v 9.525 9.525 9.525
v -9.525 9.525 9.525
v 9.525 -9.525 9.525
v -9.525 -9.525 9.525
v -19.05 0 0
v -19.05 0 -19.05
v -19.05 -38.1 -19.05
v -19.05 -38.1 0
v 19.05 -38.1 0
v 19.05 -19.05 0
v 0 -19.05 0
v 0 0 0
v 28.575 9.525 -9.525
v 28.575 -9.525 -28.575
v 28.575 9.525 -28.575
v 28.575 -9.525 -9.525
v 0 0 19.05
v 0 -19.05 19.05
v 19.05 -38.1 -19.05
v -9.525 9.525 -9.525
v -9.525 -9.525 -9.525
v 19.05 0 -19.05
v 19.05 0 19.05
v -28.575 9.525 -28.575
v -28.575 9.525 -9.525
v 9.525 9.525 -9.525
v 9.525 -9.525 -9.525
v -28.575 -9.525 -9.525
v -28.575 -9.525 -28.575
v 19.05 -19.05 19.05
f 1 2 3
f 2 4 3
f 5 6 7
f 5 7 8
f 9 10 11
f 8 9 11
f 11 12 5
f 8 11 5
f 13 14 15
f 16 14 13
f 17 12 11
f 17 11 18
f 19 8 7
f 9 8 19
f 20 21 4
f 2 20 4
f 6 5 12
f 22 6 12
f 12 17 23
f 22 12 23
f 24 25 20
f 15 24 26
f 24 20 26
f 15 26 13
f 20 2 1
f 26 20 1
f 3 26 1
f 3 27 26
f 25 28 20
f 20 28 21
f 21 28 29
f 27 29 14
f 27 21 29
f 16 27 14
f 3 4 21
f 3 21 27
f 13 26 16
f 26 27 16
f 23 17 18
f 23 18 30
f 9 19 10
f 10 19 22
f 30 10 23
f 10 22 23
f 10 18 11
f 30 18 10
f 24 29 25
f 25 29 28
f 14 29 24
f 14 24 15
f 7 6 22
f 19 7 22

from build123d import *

# Parameters (mm, degrees)
F0_W     = 19.05
F0_H     = 19.05
F1_DEPTH = 9.525
F2_W     = 19.05
F2_H     = 19.05
F3_DEPTH = 38.1
F4_DEPTH = 19.05


with BuildPart() as f1:
    # F0 (on Front) → F1 (new body, symmetric)
    with BuildSketch(Plane.XZ):
        Rectangle(F0_W, F0_H)
        with Locations((-19.05, -19.05)):
            Rectangle(F0_W, F0_H)
        with Locations((0, -19.05)):
            Rectangle(F0_W, F0_H)
        with Locations((19.05, -19.05)):
            Rectangle(F0_W, F0_H)
    extrude(amount=F1_DEPTH, both=True)


with BuildPart() as f3:
    # F2 (on Front) → F3 (new body)
    with BuildSketch(Plane.XZ):
        with Locations((-9.525, -9.525)):
            Rectangle(F2_W, F2_H)
        with Locations((9.525, -9.525)):
            Rectangle(F2_W, F2_H)
    extrude(amount=F3_DEPTH)

    # F2 (on Front) → F4 (join)
    with BuildSketch(Plane.XZ):
        with Locations((-9.525, -9.525)):
            Rectangle(F2_W, F2_H)
        with Locations((9.525, -9.525)):
            Rectangle(F2_W, F2_H)
        with Locations((9.525, 9.525)):
            Rectangle(F2_W, F2_H)
    extrude(amount=F4_DEPTH)


solid = Compound([f1.part, f3.part])
